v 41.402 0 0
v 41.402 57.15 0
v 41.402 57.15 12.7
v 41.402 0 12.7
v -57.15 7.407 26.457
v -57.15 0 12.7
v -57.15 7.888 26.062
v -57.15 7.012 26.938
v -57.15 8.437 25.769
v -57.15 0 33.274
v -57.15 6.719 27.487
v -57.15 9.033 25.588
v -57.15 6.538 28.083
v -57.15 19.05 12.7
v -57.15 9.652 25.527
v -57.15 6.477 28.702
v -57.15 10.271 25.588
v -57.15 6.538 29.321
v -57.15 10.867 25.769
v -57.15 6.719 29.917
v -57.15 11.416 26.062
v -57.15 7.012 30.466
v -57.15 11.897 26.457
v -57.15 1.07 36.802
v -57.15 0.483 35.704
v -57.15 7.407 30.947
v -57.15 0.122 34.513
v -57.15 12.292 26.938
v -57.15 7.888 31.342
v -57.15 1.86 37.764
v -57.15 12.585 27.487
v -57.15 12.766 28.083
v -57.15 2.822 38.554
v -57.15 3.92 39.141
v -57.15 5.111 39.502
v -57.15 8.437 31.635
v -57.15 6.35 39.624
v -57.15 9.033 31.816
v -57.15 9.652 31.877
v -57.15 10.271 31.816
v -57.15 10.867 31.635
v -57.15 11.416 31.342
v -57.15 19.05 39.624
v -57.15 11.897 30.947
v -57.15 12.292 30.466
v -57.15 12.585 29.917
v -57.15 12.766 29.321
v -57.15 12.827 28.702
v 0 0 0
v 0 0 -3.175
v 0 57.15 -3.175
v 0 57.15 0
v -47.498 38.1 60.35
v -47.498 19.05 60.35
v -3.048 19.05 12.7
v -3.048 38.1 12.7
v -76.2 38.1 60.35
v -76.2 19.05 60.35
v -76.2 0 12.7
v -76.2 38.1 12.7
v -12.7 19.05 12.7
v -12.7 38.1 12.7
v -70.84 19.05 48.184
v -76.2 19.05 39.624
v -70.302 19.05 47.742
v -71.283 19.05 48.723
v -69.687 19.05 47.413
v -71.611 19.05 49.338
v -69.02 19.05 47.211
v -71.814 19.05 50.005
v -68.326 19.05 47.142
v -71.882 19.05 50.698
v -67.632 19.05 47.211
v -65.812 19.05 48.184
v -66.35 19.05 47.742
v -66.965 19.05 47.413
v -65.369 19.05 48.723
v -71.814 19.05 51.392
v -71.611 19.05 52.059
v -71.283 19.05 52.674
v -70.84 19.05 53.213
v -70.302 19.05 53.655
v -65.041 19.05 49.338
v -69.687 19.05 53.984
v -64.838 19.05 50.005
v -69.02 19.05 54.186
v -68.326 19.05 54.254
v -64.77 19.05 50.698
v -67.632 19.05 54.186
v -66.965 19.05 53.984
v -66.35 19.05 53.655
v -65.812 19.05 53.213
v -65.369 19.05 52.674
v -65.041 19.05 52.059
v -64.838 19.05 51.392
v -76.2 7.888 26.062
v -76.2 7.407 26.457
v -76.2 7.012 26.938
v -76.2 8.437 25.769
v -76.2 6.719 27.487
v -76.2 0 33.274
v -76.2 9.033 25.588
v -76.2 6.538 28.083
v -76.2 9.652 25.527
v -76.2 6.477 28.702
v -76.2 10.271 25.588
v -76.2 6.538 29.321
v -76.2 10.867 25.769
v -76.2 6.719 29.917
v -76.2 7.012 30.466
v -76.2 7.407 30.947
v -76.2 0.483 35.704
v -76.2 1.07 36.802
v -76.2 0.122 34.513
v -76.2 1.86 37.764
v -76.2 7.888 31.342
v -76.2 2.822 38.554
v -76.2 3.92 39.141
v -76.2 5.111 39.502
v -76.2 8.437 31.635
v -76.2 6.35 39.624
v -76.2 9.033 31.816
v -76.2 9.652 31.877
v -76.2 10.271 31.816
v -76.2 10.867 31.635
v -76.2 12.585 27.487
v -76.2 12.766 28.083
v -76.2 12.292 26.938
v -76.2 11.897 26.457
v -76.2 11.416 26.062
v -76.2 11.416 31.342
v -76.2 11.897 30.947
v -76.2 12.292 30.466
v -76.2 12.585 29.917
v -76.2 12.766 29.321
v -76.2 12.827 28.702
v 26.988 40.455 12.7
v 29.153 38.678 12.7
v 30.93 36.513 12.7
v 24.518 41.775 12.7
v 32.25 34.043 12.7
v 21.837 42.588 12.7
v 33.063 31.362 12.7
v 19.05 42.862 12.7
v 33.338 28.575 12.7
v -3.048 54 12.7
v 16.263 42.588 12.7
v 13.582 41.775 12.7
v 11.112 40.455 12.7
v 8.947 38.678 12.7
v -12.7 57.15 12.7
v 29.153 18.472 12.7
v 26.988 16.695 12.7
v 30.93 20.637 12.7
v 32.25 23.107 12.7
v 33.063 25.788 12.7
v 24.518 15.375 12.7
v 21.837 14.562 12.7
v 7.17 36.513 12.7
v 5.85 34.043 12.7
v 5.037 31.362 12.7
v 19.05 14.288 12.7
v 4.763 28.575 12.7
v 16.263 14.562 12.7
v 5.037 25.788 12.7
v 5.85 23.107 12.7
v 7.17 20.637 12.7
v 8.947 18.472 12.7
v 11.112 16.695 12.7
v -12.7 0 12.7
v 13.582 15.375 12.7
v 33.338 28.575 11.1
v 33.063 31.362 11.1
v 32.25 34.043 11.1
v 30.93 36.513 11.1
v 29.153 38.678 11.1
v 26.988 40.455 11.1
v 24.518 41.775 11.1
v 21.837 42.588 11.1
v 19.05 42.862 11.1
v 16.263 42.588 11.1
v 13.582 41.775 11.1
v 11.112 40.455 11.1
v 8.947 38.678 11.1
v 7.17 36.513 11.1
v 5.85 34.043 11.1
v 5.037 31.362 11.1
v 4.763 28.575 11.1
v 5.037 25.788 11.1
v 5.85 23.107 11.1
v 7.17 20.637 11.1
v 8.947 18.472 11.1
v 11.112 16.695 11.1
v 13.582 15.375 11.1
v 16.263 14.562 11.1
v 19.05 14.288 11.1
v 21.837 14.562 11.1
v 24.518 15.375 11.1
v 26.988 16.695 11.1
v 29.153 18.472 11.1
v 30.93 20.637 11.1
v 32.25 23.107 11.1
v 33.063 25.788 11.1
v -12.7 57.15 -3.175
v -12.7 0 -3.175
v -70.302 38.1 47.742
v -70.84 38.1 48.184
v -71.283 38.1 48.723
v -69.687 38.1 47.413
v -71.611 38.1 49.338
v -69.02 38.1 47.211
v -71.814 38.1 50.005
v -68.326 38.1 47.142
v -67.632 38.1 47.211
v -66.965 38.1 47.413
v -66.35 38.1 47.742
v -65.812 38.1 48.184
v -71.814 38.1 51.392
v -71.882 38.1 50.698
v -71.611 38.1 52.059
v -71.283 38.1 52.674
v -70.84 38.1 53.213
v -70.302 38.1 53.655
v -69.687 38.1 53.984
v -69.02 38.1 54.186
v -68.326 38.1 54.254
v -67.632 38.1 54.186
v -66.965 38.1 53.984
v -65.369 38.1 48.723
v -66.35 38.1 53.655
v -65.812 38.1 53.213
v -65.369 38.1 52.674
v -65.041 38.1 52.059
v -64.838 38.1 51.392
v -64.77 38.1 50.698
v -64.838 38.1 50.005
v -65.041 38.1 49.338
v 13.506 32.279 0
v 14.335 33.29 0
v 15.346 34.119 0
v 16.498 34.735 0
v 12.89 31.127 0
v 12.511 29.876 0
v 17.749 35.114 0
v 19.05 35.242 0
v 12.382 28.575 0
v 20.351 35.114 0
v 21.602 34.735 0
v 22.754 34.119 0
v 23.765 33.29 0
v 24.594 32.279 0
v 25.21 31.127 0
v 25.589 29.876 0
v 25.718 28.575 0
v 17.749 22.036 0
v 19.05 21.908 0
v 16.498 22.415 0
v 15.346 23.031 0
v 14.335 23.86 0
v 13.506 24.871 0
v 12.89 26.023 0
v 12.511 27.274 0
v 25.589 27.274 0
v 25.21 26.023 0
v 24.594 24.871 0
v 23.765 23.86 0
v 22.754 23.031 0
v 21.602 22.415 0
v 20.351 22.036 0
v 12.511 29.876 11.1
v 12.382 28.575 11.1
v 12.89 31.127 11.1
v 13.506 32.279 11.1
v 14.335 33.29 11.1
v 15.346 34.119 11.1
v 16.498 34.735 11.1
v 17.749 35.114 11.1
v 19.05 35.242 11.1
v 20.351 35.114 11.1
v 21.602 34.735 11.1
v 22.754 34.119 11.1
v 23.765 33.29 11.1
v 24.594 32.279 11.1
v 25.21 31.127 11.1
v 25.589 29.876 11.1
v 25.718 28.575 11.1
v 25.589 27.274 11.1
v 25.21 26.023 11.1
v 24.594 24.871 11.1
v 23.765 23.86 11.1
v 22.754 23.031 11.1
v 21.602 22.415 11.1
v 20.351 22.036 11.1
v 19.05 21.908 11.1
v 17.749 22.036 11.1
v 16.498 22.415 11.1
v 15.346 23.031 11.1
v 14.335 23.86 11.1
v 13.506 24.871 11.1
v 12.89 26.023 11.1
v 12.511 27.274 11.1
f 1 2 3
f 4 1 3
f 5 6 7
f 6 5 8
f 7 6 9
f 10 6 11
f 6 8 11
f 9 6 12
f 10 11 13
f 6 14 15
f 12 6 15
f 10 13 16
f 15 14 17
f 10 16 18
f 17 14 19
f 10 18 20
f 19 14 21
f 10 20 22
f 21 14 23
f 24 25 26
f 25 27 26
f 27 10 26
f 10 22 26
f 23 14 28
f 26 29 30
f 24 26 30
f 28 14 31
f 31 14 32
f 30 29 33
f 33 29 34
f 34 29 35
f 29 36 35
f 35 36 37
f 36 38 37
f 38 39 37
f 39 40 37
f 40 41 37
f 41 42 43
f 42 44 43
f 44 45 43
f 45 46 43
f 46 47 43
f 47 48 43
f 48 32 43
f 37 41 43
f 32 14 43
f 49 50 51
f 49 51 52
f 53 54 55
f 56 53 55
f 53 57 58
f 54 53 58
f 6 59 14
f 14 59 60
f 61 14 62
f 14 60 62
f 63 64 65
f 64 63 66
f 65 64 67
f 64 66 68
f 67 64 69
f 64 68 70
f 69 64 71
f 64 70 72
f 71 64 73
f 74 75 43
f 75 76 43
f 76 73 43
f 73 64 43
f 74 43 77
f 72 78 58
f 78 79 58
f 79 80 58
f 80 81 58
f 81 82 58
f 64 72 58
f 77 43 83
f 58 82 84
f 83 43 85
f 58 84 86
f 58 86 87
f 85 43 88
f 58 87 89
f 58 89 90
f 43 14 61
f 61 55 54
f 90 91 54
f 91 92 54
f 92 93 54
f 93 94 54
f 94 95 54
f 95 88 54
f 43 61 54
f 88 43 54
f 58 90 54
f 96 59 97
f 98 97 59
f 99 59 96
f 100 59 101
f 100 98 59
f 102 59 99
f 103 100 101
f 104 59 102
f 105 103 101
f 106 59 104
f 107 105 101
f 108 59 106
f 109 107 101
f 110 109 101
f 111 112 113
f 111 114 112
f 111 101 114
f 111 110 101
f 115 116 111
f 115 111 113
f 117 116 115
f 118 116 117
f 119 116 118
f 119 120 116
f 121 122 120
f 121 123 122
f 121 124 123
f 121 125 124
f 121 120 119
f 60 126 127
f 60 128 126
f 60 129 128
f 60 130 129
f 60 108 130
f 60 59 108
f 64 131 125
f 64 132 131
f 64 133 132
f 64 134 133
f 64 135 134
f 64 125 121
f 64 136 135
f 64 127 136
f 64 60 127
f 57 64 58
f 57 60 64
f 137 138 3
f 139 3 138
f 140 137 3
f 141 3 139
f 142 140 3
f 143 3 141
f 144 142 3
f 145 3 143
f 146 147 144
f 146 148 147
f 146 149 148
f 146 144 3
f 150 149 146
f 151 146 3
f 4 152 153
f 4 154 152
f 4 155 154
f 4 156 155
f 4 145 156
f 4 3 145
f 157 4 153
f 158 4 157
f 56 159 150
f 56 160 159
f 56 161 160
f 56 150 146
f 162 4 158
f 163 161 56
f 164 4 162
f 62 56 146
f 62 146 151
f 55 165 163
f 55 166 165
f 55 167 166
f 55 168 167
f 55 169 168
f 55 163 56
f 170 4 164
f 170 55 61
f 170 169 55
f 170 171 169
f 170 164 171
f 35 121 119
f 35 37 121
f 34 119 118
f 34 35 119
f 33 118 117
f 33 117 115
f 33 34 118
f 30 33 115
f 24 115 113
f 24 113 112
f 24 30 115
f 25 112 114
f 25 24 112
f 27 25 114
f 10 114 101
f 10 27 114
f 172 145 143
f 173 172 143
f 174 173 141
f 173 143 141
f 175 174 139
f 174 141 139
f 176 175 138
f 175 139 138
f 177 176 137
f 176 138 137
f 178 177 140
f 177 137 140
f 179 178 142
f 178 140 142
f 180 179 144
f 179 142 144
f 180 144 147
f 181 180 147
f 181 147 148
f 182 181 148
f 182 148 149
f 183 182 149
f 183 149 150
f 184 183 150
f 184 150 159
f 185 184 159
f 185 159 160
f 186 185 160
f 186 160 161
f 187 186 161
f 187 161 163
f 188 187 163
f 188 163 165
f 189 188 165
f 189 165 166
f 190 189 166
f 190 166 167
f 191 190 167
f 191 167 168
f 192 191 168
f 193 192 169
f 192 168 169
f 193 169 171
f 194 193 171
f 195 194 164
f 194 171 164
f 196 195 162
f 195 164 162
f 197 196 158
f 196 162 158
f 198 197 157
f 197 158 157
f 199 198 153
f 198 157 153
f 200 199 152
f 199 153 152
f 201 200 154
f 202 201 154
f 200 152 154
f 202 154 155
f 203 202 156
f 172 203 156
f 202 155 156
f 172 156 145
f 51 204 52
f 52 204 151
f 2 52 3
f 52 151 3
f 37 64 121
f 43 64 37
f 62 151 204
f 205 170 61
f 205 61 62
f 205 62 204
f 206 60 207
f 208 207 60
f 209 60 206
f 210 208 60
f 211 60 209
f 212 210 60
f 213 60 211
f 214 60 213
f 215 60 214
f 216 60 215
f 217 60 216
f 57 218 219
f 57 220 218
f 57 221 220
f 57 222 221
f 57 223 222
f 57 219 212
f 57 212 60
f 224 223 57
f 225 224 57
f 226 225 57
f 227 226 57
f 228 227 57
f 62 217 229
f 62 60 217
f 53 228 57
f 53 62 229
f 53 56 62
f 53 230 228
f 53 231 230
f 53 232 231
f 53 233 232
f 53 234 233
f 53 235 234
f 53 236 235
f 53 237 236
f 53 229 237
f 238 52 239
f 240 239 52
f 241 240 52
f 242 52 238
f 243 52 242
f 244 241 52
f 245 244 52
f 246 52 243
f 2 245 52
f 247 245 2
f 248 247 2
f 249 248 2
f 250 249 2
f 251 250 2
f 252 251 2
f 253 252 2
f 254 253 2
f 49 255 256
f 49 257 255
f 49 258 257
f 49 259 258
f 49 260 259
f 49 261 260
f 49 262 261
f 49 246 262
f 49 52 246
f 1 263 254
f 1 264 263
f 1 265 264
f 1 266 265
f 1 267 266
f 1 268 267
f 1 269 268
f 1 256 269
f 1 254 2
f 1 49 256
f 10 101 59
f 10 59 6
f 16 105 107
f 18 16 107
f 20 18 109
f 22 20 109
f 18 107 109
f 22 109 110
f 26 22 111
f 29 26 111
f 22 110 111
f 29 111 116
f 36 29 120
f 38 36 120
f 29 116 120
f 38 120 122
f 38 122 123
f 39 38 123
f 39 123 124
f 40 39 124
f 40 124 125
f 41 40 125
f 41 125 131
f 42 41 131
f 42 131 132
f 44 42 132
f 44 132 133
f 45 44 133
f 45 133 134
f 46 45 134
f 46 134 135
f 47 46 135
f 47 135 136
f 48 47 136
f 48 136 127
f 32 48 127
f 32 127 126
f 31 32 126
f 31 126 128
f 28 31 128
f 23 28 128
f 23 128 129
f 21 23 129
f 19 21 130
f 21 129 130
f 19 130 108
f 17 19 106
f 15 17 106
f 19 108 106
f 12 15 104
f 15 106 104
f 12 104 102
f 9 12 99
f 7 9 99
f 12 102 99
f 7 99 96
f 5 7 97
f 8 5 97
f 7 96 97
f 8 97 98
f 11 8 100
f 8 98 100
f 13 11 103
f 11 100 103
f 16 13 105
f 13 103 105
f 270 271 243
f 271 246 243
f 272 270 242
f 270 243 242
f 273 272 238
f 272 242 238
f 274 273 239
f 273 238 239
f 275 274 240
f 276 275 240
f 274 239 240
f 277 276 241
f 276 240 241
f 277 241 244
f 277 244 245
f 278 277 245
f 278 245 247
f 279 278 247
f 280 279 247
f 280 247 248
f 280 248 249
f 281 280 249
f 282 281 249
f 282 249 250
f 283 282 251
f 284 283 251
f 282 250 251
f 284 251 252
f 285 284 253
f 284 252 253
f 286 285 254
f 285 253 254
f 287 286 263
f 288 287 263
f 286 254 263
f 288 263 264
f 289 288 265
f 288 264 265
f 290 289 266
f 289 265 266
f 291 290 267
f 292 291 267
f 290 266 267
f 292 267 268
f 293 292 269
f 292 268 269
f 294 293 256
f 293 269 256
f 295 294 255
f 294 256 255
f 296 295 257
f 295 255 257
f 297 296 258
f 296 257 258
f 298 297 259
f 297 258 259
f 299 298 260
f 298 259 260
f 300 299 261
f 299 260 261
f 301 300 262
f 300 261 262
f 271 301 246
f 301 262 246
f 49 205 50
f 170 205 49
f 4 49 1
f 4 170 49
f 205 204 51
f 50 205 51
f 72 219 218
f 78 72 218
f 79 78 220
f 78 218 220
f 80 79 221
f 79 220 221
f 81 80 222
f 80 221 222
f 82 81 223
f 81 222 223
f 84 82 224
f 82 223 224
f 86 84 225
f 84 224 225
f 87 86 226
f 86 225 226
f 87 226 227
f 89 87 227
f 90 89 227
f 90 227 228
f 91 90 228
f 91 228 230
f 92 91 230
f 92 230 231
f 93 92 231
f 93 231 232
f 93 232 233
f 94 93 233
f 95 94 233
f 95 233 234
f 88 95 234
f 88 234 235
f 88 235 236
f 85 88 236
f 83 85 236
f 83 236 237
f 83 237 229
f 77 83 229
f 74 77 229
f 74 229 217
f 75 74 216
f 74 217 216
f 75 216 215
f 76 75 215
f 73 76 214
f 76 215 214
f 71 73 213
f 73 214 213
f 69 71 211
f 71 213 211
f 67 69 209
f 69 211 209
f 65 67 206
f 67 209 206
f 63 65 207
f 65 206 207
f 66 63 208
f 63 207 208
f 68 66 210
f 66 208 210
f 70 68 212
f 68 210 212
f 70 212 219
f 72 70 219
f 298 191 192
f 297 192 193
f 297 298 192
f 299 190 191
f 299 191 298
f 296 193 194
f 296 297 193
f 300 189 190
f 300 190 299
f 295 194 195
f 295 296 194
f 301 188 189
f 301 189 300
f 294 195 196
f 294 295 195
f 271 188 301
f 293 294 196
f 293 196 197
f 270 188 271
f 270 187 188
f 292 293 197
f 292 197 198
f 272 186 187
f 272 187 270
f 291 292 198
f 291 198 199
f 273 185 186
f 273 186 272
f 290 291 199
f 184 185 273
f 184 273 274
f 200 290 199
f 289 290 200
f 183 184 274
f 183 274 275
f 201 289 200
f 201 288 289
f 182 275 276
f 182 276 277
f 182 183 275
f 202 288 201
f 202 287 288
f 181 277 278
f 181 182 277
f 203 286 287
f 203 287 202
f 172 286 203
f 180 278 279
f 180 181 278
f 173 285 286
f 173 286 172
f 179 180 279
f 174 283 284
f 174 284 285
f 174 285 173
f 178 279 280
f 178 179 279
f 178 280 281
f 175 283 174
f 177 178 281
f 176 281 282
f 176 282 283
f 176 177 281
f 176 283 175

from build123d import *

# Parameters (mm, degrees)
F0_W           = 41.402
F0_H           = 12.7
F1_DEPTH       = 57.15
F3_D           = 13.335
F3_CBORE_D     = 28.575
F3_CBORE_DEPTH = 1.6002
F2_W           = 34.798
F2_H           = 19.05
F4_DEPTH       = 47.6504
F6_DEPTH       = 34.9504
F7_W           = 19.05
F7_H           = 47.6504
F8_DEPTH       = 28.702
F9_W           = 19.05
F9_H           = 26.924
F10_DEPTH      = 19.05
F11_R          = 6.35
F14_D          = 6.35
F15_D          = 7.112


with BuildPart() as f1:
    # F0 (on Front) → F1 (new body)
    with BuildSketch(Plane.XZ):
        with Locations((20.701, 6.35)):
            Rectangle(F0_W, F0_H)
        Polygon((0, -3.175), (0, 0), (0, 12.7), (-12.7, 12.7), (-12.7, -3.175), align=None)
    extrude(amount=-F1_DEPTH)

    # F3 (through all)
    with Locations(Plane.XY.offset(12.7)):
        with Locations((19.05, 28.575)):
            CounterBoreHole(F3_D / 2, F3_CBORE_D / 2, F3_CBORE_DEPTH)

    # F2 (on face) → F4 (join)
    with BuildSketch(Plane.XY.offset(12.7)):
        with Locations((-30.099, 28.575)):
            Rectangle(F2_W, F2_H)
        Polygon((-3.048, 19.05), (-3.048, 28.575), (-3.048, 38.1), (-12.7, 38.1), (-12.7, 19.05), align=None)
    extrude(amount=F4_DEPTH)

    # F5 (on face) → F6 (cut)
    with BuildSketch(Plane.XZ.offset(-19.05)):
        Polygon((-3.048, 60.3504), (-47.498, 60.3504), (-3.048, 12.7), align=None)
    extrude(amount=-F6_DEPTH, mode=Mode.SUBTRACT)

    # F7 (on face) → F8 (join)
    with BuildSketch(Plane(origin=(-47.498, 0, 0), x_dir=(0, -1, 0), z_dir=(-1, 0, 0))):
        with Locations((-28.575, 36.5252)):
            Rectangle(F7_W, F7_H)
    extrude(amount=F8_DEPTH)

    # F9 (on face) → F10 (join)
    with BuildSketch(Plane.XZ.offset(-19.05)):
        with Locations((-66.675, 26.162)):
            Rectangle(F9_W, F9_H)
    extrude(amount=F10_DEPTH)

    # F11
    f11_edges = [f1.edges().sort_by_distance(p)[0] for p in [
        (-66.675, 0, 39.624),
    ]]
    fillet(f11_edges, radius=F11_R)

    # F14 (through all)
    with Locations(Plane.YZ.offset(-57.15)):
        with Locations((9.652, 28.702)):
            Hole(F14_D / 2)

    # F15 (through all)
    with Locations(Plane.XZ.offset(-19.05)):
        with Locations((-68.326, 50.6984)):
            Hole(F15_D / 2)


solid = f1.part
